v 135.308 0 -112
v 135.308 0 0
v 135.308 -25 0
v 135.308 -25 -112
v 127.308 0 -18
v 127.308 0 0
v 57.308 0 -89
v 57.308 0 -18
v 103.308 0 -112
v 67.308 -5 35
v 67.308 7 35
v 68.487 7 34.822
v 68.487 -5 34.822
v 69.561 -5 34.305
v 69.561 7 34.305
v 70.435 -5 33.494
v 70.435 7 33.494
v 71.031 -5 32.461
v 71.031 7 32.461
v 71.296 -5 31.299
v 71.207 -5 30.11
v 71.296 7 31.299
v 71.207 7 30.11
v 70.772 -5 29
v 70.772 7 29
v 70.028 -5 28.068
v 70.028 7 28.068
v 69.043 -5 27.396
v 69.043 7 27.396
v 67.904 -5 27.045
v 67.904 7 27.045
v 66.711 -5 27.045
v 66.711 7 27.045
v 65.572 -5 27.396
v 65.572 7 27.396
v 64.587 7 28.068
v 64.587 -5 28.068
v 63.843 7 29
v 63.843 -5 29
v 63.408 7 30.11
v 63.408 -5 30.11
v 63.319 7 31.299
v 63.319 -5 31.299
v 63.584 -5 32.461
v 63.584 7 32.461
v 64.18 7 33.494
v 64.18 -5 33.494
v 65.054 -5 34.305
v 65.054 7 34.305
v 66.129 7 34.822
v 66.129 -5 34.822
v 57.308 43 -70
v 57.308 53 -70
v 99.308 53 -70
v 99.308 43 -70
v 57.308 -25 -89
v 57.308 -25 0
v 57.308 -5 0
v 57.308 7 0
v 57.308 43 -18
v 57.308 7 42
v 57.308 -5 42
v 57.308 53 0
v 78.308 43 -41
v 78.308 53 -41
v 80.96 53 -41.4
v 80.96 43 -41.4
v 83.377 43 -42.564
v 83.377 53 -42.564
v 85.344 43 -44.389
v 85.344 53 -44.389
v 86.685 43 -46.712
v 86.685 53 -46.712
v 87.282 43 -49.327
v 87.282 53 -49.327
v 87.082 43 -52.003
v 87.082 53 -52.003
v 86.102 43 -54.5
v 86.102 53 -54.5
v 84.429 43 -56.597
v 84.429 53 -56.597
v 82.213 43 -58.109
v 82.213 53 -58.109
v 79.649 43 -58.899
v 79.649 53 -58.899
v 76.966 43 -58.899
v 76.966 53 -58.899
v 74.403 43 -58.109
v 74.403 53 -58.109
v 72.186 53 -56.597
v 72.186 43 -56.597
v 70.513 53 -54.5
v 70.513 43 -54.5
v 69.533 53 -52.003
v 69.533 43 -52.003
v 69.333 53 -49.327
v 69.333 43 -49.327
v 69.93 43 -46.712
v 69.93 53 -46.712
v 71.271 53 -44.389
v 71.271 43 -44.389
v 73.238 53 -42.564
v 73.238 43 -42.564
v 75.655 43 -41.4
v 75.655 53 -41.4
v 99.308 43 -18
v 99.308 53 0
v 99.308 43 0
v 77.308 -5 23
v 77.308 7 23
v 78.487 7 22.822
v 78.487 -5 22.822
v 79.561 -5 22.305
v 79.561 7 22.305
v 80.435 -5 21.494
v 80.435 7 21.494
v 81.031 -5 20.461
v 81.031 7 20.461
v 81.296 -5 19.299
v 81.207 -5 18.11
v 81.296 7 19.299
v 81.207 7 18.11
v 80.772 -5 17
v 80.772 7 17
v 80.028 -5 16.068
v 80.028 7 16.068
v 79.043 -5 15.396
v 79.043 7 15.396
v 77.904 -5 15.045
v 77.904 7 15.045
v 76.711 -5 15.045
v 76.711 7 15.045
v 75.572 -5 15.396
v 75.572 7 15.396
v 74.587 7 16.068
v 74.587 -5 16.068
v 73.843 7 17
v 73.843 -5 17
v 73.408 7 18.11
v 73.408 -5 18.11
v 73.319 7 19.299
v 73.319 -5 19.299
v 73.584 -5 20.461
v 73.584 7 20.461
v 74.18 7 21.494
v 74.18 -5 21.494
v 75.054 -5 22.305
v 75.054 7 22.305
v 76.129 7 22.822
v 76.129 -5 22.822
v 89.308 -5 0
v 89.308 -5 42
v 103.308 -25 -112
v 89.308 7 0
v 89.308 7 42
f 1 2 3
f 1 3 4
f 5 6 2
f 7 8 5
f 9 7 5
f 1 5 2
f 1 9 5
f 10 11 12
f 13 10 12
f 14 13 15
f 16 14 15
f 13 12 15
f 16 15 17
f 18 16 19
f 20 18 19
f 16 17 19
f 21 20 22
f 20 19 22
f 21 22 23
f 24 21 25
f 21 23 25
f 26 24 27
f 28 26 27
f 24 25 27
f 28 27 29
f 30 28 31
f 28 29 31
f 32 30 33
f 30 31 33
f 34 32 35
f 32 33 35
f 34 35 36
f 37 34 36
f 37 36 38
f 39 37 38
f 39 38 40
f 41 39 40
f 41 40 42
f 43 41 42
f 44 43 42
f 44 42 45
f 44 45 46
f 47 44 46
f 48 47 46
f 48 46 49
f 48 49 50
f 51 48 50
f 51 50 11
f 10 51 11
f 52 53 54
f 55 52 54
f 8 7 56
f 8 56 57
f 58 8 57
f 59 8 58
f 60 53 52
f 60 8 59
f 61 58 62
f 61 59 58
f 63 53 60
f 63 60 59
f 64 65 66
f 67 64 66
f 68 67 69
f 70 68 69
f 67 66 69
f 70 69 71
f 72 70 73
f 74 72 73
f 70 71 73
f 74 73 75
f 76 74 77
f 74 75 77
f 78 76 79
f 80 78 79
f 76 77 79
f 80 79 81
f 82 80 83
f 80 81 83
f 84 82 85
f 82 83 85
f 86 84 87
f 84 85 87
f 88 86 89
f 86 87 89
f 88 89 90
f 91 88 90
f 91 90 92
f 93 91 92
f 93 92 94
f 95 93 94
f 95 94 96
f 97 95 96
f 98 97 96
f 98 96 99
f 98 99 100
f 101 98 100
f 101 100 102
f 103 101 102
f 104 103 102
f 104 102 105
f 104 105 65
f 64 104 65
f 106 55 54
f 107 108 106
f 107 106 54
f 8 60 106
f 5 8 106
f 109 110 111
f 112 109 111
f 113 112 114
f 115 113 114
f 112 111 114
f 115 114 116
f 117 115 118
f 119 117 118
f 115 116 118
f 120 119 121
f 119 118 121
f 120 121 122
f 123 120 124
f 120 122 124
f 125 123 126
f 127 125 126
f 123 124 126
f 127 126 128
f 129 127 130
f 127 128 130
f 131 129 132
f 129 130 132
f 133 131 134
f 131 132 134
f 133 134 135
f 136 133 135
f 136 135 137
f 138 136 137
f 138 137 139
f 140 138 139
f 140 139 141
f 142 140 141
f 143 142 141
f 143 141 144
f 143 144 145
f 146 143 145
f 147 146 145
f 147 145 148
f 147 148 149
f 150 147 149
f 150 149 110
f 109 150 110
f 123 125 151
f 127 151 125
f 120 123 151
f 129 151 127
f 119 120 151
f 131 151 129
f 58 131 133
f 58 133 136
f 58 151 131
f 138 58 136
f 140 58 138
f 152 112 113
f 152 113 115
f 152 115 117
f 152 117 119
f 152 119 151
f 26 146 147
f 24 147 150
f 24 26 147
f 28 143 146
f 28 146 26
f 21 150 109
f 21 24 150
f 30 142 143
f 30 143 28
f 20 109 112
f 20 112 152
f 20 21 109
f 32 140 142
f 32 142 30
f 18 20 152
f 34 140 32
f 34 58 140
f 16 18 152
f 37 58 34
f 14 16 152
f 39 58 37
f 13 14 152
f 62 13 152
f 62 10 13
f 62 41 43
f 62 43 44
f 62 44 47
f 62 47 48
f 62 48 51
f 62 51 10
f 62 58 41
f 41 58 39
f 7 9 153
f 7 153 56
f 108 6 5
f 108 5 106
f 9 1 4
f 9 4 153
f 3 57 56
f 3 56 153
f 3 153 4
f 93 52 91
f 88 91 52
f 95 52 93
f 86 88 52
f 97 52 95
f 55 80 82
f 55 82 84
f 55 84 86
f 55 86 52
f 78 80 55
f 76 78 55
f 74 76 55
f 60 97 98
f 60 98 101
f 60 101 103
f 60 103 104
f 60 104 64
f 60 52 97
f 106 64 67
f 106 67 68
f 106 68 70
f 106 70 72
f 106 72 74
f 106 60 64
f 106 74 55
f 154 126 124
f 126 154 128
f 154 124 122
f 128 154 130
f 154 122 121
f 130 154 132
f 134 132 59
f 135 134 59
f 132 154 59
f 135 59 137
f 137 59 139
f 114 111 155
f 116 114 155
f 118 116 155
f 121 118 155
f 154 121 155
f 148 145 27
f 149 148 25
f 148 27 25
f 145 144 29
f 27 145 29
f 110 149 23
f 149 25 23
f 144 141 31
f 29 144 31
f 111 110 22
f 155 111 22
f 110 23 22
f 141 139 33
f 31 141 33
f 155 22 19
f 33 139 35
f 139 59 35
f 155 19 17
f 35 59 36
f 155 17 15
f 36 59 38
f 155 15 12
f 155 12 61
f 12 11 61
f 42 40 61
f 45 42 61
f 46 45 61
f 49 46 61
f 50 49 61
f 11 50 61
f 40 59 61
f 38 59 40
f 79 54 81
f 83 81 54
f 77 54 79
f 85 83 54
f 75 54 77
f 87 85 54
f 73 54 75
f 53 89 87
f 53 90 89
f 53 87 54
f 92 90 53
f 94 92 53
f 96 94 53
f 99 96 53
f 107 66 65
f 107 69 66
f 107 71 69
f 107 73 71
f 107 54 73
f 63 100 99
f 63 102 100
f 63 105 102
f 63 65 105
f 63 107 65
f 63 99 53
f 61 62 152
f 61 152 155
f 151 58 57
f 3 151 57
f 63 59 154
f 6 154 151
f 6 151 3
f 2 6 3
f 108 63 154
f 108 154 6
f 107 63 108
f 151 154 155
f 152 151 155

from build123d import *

# Parameters (mm, degrees)
BOSS_EXTRUDE1_DEPTH = 25
BOSS_EXTRUDE2_DEPTH = 18
SKETCH3_W           = 42
SKETCH3_H           = 10
BOSS_EXTRUDE3_DEPTH = 70
CUT_EXTRUDE1_REACH  = 194.188
SKETCH4_R           = 9
SKETCH5_W           = 42
SKETCH5_H           = 12
BOSS_EXTRUDE4_DEPTH = 32
CUT_EXTRUDE2_REACH  = 183.571
SKETCH6_R           = 4


with BuildPart() as part:
    # Sketch1 → Boss-Extrude1 (new body)
    with BuildSketch(Plane(origin=(0, 0, 0), x_dir=(1, 0, 0), z_dir=(0, 1, 0))):
        Polygon((57.307550645, 0), (135.307550645, 0), (135.307550645, 112), (103.307550645, 112), (57.307550645, 89), align=None)
    extrude(amount=-BOSS_EXTRUDE1_DEPTH)

    # Sketch2 → Boss-Extrude2 (add)
    with BuildSketch(Plane.XY):
        Polygon((57.307550645, 0), (127.307550645, 0), (99.307550645, 43), (99.307550645, 53), (57.307550645, 53), align=None)
    extrude(amount=-BOSS_EXTRUDE2_DEPTH)

    # Sketch3 → Boss-Extrude3 (add)
    with BuildSketch(Plane.XY):
        with Locations((78.307550645, 48)):
            Rectangle(SKETCH3_W, SKETCH3_H)
    extrude(amount=-BOSS_EXTRUDE3_DEPTH)

    # Sketch4 → Cut-Extrude1 (cut, up to next)
    with BuildSketch(Plane(origin=(0, 53, 0), x_dir=(1, 0, 0), z_dir=(0, 1, 0)), mode=Mode.PRIVATE) as cut_extrude1_sk1:
        with Locations(Location((78.307550645, 50, 0), (0, 0, 270))):
            Circle(SKETCH4_R)
    cut_extrude1_tool1 = extrude(cut_extrude1_sk1.sketch, amount=-CUT_EXTRUDE1_REACH, mode=Mode.PRIVATE) & part.part
    add(cut_extrude1_tool1.solids().sort_by_distance((78.307551, 53, -50))[0], mode=Mode.SUBTRACT)

    # Sketch5 → Boss-Extrude4 (add)
    with BuildSketch(Plane.ZY.offset(-57.307550645)):
        with Locations((21, 1)):
            Rectangle(SKETCH5_W, SKETCH5_H)
    extrude(amount=-BOSS_EXTRUDE4_DEPTH)

    # Sketch6 → Cut-Extrude2 (cut, up to next)
    with BuildSketch(Plane(origin=(0, 7, 0), x_dir=(1, 0, 0), z_dir=(0, 1, 0)), mode=Mode.PRIVATE) as cut_extrude2_sk1:
        with Locations(Location((67.307550645, -31, 0), (0, 0, 270))):
            Circle(SKETCH6_R)
    cut_extrude2_tool1 = extrude(cut_extrude2_sk1.sketch, amount=-CUT_EXTRUDE2_REACH, mode=Mode.PRIVATE) & part.part
    # Sketch6 → Cut-Extrude2 (cut, up to next)
    with BuildSketch(Plane(origin=(0, 7, 0), x_dir=(1, 0, 0), z_dir=(0, 1, 0)), mode=Mode.PRIVATE) as cut_extrude2_sk2:
        with Locations(Location((77.307550645, -19, 0), (0, 0, 270))):
            Circle(SKETCH6_R)
    cut_extrude2_tool2 = extrude(cut_extrude2_sk2.sketch, amount=-CUT_EXTRUDE2_REACH, mode=Mode.PRIVATE) & part.part
    add(cut_extrude2_tool1.solids().sort_by_distance((67.307551, 7, 31))[0], mode=Mode.SUBTRACT)
    add(cut_extrude2_tool2.solids().sort_by_distance((77.307551, 7, 19))[0], mode=Mode.SUBTRACT)


solid = part.part
